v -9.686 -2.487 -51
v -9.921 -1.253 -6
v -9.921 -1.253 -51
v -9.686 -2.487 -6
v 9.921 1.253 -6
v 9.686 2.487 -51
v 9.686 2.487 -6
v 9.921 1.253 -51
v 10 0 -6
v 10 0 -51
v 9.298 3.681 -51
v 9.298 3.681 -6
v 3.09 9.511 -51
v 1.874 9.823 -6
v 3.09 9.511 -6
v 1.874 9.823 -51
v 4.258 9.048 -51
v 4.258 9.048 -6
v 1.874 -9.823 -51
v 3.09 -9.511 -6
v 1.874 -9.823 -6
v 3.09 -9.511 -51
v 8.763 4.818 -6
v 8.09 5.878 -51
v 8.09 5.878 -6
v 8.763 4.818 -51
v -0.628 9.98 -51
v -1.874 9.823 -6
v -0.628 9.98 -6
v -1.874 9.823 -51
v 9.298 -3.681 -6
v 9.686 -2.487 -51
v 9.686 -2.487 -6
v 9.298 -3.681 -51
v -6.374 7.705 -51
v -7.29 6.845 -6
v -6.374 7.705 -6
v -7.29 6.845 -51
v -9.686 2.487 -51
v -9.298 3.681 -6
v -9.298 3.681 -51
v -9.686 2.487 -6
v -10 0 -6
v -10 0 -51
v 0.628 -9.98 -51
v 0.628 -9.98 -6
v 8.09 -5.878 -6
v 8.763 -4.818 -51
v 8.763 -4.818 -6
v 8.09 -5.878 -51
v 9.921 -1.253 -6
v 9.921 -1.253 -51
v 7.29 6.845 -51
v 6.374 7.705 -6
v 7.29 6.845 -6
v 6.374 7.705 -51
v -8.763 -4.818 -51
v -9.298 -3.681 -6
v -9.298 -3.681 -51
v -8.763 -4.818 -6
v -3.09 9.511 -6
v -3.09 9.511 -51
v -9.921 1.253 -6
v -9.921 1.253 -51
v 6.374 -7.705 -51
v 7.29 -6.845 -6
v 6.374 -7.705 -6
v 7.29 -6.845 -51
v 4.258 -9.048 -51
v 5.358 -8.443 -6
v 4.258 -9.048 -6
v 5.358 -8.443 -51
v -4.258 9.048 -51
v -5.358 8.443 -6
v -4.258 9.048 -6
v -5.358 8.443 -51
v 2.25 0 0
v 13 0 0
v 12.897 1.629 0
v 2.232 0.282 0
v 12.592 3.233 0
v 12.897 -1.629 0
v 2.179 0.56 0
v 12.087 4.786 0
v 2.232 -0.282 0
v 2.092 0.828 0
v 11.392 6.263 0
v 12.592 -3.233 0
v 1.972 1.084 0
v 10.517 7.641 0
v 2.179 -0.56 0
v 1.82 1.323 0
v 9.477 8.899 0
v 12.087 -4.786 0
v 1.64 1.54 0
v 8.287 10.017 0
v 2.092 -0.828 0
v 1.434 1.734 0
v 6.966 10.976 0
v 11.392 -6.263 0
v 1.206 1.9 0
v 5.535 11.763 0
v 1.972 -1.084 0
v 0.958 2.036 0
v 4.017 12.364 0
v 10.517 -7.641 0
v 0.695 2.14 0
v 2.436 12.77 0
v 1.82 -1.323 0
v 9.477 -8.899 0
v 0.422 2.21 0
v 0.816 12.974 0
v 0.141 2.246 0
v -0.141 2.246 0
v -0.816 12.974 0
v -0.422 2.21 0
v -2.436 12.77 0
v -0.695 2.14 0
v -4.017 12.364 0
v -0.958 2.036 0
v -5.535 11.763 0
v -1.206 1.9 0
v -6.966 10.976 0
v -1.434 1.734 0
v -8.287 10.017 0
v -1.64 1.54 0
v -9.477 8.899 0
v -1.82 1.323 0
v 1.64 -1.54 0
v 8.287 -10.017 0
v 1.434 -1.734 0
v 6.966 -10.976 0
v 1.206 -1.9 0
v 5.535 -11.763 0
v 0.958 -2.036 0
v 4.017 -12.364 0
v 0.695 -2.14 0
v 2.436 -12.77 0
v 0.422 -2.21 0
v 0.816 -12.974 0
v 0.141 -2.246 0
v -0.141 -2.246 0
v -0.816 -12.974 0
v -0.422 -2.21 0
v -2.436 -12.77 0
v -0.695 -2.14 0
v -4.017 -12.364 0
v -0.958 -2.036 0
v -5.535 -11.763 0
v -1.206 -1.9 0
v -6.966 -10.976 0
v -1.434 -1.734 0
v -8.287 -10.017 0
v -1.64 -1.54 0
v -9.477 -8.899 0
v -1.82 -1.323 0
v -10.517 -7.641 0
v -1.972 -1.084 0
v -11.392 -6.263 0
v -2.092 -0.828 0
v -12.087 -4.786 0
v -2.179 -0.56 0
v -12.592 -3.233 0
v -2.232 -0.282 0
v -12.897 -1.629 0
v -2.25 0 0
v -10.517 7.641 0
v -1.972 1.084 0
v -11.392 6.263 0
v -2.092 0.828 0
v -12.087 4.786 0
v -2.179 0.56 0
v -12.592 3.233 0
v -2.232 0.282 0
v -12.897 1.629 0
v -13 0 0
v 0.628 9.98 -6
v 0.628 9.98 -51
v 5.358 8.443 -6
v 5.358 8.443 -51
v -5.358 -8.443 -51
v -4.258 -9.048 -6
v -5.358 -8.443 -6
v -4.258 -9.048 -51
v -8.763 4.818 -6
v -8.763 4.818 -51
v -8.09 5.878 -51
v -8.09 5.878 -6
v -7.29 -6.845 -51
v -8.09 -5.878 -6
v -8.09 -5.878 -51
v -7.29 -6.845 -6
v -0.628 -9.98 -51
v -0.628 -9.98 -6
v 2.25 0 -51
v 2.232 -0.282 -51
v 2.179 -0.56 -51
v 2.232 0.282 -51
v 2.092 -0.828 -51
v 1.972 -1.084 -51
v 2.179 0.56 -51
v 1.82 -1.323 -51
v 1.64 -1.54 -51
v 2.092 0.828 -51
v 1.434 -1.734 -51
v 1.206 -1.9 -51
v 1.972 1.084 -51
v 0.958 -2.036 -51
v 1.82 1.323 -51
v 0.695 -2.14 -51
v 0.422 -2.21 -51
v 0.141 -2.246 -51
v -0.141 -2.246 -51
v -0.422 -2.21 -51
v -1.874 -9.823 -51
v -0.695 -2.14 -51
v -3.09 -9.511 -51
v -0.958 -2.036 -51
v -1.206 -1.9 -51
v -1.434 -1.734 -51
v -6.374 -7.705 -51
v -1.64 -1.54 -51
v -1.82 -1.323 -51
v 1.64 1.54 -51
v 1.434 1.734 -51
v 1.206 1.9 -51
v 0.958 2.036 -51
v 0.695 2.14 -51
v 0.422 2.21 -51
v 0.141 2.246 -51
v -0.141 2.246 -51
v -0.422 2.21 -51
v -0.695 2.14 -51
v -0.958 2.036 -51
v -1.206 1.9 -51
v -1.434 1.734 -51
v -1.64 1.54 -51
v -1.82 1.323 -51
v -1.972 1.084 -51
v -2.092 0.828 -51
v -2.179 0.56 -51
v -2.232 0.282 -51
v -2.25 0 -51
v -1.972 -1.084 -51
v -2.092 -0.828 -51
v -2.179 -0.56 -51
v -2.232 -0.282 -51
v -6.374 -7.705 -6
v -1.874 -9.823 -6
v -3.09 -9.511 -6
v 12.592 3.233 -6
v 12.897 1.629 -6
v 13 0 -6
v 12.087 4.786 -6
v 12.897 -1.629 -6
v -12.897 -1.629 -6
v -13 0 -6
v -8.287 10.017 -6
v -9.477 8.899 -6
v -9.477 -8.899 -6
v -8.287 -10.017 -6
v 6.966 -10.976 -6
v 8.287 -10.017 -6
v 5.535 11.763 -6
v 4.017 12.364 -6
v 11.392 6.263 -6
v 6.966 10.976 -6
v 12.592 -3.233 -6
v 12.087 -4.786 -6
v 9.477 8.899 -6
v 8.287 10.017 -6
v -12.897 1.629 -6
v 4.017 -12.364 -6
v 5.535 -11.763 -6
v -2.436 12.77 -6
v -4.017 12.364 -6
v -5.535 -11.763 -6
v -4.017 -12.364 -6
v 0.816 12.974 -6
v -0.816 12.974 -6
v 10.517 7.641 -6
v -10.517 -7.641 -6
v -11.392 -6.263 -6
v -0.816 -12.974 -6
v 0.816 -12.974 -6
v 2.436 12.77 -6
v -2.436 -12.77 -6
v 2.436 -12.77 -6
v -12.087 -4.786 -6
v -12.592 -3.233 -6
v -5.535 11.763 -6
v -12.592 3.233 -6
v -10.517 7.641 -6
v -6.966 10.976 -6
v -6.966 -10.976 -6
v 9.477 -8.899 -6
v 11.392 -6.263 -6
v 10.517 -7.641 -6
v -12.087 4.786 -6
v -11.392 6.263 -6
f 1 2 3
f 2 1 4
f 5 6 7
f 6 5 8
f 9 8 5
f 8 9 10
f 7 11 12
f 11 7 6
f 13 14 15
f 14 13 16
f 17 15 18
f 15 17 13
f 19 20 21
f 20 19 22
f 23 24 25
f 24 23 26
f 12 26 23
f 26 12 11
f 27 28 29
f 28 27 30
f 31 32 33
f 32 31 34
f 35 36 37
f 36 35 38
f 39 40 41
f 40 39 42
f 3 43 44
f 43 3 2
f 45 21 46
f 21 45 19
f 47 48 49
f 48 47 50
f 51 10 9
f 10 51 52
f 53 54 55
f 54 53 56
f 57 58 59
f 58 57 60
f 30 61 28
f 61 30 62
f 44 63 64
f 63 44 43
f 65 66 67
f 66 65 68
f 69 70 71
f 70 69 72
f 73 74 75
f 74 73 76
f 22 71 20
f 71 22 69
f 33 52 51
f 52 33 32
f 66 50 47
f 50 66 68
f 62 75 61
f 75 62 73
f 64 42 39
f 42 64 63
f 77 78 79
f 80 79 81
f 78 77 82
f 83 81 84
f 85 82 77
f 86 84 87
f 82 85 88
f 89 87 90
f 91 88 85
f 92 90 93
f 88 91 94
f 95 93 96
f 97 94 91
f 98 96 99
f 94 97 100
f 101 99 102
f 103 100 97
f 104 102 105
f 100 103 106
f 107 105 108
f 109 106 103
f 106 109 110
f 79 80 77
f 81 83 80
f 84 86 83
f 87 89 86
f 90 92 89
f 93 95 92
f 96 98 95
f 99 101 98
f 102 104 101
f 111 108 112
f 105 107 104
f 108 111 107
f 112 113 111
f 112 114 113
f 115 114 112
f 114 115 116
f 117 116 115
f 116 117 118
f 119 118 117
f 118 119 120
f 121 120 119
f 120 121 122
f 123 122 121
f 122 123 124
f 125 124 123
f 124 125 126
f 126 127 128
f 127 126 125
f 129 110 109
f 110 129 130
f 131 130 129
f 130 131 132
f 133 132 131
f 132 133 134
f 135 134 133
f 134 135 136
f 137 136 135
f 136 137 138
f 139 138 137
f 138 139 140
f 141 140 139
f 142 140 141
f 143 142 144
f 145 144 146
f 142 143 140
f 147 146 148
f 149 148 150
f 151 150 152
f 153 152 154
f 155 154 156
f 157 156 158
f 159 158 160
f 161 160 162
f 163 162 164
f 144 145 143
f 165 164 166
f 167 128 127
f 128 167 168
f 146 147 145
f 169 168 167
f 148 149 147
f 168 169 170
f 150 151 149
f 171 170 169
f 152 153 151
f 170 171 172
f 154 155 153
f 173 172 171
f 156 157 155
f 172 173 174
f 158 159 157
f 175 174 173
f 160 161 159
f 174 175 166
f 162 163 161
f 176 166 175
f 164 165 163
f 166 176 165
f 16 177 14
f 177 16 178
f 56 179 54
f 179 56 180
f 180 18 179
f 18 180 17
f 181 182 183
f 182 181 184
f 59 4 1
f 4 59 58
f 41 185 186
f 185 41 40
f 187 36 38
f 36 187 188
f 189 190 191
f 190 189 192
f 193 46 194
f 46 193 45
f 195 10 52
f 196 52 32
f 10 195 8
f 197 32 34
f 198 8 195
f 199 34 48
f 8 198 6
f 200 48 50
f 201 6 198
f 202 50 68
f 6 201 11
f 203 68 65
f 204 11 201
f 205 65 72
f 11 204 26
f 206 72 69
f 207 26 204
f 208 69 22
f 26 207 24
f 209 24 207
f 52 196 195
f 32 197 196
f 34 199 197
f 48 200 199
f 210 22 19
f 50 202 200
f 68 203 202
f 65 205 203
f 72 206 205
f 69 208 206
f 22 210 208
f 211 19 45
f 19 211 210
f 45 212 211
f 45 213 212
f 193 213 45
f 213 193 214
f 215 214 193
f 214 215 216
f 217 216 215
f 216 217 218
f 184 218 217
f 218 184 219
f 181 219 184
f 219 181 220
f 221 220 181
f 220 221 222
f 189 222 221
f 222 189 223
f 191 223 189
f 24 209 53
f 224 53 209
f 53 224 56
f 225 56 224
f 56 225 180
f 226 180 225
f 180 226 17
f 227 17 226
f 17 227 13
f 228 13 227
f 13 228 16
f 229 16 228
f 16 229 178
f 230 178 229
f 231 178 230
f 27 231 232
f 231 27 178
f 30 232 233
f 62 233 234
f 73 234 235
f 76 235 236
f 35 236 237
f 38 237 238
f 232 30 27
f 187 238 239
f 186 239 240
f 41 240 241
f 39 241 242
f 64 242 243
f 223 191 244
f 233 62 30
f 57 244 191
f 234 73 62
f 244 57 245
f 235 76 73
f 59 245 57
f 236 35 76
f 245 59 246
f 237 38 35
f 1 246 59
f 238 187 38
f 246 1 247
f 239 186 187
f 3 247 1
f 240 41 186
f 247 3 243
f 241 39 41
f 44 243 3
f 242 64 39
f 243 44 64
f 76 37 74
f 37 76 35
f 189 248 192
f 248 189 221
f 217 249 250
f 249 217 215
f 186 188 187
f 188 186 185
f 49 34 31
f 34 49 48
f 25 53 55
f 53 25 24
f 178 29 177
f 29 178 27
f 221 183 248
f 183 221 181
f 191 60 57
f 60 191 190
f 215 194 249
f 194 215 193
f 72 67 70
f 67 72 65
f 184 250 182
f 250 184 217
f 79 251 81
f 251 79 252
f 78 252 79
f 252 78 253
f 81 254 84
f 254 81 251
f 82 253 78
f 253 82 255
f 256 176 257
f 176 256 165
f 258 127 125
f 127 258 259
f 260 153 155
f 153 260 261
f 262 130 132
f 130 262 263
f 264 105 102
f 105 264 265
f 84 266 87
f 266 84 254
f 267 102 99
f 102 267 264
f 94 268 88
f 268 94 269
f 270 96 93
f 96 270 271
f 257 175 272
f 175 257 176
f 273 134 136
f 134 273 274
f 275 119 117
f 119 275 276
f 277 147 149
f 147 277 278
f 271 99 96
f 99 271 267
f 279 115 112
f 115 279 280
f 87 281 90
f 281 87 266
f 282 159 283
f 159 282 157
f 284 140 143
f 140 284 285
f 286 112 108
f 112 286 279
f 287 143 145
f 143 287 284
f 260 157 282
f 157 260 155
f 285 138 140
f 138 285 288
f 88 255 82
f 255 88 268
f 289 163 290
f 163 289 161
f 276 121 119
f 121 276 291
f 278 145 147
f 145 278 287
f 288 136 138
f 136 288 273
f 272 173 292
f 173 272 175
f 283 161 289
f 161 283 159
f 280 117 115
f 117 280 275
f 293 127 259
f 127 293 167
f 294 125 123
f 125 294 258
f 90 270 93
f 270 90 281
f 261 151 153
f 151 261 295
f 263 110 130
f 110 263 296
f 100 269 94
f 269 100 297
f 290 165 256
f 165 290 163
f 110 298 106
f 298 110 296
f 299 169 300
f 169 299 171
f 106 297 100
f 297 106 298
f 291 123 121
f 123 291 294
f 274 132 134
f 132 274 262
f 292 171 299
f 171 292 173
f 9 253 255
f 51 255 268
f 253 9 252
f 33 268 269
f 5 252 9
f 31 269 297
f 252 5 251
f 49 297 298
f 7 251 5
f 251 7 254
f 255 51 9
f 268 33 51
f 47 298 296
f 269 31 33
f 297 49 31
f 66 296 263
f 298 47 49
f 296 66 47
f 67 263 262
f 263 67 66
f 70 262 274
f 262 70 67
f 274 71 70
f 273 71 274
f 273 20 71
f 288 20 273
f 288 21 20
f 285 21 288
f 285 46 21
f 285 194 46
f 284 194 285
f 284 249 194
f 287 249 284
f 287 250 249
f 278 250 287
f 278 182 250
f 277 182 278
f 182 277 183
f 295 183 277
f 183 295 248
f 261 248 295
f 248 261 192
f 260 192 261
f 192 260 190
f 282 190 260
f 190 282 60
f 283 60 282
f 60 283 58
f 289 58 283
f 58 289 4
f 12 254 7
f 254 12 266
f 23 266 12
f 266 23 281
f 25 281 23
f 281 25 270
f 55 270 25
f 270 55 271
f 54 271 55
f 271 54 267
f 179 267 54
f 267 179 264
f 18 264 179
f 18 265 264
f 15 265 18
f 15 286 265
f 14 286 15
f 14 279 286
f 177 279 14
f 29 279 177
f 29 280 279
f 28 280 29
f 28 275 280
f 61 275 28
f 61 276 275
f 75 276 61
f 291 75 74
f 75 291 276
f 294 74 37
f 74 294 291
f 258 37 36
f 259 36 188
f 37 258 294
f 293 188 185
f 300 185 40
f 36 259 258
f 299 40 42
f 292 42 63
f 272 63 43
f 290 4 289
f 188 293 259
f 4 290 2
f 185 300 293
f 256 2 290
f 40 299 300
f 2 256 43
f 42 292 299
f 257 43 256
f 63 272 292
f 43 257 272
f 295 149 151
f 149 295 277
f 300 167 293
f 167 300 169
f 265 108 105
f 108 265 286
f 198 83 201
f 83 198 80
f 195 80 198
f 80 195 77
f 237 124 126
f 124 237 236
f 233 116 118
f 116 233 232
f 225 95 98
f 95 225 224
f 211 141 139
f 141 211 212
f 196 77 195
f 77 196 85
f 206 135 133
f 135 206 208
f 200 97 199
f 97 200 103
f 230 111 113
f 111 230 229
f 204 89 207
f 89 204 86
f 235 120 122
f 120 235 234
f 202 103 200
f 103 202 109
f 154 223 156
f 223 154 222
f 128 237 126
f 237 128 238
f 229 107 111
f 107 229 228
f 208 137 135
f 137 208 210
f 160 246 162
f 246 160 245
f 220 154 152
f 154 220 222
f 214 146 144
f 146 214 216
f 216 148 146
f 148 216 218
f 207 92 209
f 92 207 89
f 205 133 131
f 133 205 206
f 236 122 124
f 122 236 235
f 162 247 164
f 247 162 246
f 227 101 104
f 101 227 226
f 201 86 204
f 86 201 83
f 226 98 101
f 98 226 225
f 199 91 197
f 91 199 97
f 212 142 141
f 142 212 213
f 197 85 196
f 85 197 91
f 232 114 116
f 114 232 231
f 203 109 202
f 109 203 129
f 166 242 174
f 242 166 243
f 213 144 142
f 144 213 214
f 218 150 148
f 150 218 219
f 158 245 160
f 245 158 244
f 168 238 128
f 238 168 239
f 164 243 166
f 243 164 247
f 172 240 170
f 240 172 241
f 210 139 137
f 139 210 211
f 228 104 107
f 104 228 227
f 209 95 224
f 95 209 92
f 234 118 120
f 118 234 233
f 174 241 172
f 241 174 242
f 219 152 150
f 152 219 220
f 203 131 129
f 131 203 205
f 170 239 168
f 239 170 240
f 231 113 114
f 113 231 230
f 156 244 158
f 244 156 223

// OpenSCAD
$fn = 50;


difference() {
	union() {
		translate(v = [0, 0, -51.0000000000]) {
			cylinder(h = 51, r = 10.0000000000);
		}
		translate(v = [0, 0, -6.0000000000]) {
			cylinder(h = 6, r = 13.0000000000);
		}
	}
	union() {
		#translate(v = [0, 0, -51]) {
			cylinder(h = 51, r = 2.2500000000);
		}
	}
}
